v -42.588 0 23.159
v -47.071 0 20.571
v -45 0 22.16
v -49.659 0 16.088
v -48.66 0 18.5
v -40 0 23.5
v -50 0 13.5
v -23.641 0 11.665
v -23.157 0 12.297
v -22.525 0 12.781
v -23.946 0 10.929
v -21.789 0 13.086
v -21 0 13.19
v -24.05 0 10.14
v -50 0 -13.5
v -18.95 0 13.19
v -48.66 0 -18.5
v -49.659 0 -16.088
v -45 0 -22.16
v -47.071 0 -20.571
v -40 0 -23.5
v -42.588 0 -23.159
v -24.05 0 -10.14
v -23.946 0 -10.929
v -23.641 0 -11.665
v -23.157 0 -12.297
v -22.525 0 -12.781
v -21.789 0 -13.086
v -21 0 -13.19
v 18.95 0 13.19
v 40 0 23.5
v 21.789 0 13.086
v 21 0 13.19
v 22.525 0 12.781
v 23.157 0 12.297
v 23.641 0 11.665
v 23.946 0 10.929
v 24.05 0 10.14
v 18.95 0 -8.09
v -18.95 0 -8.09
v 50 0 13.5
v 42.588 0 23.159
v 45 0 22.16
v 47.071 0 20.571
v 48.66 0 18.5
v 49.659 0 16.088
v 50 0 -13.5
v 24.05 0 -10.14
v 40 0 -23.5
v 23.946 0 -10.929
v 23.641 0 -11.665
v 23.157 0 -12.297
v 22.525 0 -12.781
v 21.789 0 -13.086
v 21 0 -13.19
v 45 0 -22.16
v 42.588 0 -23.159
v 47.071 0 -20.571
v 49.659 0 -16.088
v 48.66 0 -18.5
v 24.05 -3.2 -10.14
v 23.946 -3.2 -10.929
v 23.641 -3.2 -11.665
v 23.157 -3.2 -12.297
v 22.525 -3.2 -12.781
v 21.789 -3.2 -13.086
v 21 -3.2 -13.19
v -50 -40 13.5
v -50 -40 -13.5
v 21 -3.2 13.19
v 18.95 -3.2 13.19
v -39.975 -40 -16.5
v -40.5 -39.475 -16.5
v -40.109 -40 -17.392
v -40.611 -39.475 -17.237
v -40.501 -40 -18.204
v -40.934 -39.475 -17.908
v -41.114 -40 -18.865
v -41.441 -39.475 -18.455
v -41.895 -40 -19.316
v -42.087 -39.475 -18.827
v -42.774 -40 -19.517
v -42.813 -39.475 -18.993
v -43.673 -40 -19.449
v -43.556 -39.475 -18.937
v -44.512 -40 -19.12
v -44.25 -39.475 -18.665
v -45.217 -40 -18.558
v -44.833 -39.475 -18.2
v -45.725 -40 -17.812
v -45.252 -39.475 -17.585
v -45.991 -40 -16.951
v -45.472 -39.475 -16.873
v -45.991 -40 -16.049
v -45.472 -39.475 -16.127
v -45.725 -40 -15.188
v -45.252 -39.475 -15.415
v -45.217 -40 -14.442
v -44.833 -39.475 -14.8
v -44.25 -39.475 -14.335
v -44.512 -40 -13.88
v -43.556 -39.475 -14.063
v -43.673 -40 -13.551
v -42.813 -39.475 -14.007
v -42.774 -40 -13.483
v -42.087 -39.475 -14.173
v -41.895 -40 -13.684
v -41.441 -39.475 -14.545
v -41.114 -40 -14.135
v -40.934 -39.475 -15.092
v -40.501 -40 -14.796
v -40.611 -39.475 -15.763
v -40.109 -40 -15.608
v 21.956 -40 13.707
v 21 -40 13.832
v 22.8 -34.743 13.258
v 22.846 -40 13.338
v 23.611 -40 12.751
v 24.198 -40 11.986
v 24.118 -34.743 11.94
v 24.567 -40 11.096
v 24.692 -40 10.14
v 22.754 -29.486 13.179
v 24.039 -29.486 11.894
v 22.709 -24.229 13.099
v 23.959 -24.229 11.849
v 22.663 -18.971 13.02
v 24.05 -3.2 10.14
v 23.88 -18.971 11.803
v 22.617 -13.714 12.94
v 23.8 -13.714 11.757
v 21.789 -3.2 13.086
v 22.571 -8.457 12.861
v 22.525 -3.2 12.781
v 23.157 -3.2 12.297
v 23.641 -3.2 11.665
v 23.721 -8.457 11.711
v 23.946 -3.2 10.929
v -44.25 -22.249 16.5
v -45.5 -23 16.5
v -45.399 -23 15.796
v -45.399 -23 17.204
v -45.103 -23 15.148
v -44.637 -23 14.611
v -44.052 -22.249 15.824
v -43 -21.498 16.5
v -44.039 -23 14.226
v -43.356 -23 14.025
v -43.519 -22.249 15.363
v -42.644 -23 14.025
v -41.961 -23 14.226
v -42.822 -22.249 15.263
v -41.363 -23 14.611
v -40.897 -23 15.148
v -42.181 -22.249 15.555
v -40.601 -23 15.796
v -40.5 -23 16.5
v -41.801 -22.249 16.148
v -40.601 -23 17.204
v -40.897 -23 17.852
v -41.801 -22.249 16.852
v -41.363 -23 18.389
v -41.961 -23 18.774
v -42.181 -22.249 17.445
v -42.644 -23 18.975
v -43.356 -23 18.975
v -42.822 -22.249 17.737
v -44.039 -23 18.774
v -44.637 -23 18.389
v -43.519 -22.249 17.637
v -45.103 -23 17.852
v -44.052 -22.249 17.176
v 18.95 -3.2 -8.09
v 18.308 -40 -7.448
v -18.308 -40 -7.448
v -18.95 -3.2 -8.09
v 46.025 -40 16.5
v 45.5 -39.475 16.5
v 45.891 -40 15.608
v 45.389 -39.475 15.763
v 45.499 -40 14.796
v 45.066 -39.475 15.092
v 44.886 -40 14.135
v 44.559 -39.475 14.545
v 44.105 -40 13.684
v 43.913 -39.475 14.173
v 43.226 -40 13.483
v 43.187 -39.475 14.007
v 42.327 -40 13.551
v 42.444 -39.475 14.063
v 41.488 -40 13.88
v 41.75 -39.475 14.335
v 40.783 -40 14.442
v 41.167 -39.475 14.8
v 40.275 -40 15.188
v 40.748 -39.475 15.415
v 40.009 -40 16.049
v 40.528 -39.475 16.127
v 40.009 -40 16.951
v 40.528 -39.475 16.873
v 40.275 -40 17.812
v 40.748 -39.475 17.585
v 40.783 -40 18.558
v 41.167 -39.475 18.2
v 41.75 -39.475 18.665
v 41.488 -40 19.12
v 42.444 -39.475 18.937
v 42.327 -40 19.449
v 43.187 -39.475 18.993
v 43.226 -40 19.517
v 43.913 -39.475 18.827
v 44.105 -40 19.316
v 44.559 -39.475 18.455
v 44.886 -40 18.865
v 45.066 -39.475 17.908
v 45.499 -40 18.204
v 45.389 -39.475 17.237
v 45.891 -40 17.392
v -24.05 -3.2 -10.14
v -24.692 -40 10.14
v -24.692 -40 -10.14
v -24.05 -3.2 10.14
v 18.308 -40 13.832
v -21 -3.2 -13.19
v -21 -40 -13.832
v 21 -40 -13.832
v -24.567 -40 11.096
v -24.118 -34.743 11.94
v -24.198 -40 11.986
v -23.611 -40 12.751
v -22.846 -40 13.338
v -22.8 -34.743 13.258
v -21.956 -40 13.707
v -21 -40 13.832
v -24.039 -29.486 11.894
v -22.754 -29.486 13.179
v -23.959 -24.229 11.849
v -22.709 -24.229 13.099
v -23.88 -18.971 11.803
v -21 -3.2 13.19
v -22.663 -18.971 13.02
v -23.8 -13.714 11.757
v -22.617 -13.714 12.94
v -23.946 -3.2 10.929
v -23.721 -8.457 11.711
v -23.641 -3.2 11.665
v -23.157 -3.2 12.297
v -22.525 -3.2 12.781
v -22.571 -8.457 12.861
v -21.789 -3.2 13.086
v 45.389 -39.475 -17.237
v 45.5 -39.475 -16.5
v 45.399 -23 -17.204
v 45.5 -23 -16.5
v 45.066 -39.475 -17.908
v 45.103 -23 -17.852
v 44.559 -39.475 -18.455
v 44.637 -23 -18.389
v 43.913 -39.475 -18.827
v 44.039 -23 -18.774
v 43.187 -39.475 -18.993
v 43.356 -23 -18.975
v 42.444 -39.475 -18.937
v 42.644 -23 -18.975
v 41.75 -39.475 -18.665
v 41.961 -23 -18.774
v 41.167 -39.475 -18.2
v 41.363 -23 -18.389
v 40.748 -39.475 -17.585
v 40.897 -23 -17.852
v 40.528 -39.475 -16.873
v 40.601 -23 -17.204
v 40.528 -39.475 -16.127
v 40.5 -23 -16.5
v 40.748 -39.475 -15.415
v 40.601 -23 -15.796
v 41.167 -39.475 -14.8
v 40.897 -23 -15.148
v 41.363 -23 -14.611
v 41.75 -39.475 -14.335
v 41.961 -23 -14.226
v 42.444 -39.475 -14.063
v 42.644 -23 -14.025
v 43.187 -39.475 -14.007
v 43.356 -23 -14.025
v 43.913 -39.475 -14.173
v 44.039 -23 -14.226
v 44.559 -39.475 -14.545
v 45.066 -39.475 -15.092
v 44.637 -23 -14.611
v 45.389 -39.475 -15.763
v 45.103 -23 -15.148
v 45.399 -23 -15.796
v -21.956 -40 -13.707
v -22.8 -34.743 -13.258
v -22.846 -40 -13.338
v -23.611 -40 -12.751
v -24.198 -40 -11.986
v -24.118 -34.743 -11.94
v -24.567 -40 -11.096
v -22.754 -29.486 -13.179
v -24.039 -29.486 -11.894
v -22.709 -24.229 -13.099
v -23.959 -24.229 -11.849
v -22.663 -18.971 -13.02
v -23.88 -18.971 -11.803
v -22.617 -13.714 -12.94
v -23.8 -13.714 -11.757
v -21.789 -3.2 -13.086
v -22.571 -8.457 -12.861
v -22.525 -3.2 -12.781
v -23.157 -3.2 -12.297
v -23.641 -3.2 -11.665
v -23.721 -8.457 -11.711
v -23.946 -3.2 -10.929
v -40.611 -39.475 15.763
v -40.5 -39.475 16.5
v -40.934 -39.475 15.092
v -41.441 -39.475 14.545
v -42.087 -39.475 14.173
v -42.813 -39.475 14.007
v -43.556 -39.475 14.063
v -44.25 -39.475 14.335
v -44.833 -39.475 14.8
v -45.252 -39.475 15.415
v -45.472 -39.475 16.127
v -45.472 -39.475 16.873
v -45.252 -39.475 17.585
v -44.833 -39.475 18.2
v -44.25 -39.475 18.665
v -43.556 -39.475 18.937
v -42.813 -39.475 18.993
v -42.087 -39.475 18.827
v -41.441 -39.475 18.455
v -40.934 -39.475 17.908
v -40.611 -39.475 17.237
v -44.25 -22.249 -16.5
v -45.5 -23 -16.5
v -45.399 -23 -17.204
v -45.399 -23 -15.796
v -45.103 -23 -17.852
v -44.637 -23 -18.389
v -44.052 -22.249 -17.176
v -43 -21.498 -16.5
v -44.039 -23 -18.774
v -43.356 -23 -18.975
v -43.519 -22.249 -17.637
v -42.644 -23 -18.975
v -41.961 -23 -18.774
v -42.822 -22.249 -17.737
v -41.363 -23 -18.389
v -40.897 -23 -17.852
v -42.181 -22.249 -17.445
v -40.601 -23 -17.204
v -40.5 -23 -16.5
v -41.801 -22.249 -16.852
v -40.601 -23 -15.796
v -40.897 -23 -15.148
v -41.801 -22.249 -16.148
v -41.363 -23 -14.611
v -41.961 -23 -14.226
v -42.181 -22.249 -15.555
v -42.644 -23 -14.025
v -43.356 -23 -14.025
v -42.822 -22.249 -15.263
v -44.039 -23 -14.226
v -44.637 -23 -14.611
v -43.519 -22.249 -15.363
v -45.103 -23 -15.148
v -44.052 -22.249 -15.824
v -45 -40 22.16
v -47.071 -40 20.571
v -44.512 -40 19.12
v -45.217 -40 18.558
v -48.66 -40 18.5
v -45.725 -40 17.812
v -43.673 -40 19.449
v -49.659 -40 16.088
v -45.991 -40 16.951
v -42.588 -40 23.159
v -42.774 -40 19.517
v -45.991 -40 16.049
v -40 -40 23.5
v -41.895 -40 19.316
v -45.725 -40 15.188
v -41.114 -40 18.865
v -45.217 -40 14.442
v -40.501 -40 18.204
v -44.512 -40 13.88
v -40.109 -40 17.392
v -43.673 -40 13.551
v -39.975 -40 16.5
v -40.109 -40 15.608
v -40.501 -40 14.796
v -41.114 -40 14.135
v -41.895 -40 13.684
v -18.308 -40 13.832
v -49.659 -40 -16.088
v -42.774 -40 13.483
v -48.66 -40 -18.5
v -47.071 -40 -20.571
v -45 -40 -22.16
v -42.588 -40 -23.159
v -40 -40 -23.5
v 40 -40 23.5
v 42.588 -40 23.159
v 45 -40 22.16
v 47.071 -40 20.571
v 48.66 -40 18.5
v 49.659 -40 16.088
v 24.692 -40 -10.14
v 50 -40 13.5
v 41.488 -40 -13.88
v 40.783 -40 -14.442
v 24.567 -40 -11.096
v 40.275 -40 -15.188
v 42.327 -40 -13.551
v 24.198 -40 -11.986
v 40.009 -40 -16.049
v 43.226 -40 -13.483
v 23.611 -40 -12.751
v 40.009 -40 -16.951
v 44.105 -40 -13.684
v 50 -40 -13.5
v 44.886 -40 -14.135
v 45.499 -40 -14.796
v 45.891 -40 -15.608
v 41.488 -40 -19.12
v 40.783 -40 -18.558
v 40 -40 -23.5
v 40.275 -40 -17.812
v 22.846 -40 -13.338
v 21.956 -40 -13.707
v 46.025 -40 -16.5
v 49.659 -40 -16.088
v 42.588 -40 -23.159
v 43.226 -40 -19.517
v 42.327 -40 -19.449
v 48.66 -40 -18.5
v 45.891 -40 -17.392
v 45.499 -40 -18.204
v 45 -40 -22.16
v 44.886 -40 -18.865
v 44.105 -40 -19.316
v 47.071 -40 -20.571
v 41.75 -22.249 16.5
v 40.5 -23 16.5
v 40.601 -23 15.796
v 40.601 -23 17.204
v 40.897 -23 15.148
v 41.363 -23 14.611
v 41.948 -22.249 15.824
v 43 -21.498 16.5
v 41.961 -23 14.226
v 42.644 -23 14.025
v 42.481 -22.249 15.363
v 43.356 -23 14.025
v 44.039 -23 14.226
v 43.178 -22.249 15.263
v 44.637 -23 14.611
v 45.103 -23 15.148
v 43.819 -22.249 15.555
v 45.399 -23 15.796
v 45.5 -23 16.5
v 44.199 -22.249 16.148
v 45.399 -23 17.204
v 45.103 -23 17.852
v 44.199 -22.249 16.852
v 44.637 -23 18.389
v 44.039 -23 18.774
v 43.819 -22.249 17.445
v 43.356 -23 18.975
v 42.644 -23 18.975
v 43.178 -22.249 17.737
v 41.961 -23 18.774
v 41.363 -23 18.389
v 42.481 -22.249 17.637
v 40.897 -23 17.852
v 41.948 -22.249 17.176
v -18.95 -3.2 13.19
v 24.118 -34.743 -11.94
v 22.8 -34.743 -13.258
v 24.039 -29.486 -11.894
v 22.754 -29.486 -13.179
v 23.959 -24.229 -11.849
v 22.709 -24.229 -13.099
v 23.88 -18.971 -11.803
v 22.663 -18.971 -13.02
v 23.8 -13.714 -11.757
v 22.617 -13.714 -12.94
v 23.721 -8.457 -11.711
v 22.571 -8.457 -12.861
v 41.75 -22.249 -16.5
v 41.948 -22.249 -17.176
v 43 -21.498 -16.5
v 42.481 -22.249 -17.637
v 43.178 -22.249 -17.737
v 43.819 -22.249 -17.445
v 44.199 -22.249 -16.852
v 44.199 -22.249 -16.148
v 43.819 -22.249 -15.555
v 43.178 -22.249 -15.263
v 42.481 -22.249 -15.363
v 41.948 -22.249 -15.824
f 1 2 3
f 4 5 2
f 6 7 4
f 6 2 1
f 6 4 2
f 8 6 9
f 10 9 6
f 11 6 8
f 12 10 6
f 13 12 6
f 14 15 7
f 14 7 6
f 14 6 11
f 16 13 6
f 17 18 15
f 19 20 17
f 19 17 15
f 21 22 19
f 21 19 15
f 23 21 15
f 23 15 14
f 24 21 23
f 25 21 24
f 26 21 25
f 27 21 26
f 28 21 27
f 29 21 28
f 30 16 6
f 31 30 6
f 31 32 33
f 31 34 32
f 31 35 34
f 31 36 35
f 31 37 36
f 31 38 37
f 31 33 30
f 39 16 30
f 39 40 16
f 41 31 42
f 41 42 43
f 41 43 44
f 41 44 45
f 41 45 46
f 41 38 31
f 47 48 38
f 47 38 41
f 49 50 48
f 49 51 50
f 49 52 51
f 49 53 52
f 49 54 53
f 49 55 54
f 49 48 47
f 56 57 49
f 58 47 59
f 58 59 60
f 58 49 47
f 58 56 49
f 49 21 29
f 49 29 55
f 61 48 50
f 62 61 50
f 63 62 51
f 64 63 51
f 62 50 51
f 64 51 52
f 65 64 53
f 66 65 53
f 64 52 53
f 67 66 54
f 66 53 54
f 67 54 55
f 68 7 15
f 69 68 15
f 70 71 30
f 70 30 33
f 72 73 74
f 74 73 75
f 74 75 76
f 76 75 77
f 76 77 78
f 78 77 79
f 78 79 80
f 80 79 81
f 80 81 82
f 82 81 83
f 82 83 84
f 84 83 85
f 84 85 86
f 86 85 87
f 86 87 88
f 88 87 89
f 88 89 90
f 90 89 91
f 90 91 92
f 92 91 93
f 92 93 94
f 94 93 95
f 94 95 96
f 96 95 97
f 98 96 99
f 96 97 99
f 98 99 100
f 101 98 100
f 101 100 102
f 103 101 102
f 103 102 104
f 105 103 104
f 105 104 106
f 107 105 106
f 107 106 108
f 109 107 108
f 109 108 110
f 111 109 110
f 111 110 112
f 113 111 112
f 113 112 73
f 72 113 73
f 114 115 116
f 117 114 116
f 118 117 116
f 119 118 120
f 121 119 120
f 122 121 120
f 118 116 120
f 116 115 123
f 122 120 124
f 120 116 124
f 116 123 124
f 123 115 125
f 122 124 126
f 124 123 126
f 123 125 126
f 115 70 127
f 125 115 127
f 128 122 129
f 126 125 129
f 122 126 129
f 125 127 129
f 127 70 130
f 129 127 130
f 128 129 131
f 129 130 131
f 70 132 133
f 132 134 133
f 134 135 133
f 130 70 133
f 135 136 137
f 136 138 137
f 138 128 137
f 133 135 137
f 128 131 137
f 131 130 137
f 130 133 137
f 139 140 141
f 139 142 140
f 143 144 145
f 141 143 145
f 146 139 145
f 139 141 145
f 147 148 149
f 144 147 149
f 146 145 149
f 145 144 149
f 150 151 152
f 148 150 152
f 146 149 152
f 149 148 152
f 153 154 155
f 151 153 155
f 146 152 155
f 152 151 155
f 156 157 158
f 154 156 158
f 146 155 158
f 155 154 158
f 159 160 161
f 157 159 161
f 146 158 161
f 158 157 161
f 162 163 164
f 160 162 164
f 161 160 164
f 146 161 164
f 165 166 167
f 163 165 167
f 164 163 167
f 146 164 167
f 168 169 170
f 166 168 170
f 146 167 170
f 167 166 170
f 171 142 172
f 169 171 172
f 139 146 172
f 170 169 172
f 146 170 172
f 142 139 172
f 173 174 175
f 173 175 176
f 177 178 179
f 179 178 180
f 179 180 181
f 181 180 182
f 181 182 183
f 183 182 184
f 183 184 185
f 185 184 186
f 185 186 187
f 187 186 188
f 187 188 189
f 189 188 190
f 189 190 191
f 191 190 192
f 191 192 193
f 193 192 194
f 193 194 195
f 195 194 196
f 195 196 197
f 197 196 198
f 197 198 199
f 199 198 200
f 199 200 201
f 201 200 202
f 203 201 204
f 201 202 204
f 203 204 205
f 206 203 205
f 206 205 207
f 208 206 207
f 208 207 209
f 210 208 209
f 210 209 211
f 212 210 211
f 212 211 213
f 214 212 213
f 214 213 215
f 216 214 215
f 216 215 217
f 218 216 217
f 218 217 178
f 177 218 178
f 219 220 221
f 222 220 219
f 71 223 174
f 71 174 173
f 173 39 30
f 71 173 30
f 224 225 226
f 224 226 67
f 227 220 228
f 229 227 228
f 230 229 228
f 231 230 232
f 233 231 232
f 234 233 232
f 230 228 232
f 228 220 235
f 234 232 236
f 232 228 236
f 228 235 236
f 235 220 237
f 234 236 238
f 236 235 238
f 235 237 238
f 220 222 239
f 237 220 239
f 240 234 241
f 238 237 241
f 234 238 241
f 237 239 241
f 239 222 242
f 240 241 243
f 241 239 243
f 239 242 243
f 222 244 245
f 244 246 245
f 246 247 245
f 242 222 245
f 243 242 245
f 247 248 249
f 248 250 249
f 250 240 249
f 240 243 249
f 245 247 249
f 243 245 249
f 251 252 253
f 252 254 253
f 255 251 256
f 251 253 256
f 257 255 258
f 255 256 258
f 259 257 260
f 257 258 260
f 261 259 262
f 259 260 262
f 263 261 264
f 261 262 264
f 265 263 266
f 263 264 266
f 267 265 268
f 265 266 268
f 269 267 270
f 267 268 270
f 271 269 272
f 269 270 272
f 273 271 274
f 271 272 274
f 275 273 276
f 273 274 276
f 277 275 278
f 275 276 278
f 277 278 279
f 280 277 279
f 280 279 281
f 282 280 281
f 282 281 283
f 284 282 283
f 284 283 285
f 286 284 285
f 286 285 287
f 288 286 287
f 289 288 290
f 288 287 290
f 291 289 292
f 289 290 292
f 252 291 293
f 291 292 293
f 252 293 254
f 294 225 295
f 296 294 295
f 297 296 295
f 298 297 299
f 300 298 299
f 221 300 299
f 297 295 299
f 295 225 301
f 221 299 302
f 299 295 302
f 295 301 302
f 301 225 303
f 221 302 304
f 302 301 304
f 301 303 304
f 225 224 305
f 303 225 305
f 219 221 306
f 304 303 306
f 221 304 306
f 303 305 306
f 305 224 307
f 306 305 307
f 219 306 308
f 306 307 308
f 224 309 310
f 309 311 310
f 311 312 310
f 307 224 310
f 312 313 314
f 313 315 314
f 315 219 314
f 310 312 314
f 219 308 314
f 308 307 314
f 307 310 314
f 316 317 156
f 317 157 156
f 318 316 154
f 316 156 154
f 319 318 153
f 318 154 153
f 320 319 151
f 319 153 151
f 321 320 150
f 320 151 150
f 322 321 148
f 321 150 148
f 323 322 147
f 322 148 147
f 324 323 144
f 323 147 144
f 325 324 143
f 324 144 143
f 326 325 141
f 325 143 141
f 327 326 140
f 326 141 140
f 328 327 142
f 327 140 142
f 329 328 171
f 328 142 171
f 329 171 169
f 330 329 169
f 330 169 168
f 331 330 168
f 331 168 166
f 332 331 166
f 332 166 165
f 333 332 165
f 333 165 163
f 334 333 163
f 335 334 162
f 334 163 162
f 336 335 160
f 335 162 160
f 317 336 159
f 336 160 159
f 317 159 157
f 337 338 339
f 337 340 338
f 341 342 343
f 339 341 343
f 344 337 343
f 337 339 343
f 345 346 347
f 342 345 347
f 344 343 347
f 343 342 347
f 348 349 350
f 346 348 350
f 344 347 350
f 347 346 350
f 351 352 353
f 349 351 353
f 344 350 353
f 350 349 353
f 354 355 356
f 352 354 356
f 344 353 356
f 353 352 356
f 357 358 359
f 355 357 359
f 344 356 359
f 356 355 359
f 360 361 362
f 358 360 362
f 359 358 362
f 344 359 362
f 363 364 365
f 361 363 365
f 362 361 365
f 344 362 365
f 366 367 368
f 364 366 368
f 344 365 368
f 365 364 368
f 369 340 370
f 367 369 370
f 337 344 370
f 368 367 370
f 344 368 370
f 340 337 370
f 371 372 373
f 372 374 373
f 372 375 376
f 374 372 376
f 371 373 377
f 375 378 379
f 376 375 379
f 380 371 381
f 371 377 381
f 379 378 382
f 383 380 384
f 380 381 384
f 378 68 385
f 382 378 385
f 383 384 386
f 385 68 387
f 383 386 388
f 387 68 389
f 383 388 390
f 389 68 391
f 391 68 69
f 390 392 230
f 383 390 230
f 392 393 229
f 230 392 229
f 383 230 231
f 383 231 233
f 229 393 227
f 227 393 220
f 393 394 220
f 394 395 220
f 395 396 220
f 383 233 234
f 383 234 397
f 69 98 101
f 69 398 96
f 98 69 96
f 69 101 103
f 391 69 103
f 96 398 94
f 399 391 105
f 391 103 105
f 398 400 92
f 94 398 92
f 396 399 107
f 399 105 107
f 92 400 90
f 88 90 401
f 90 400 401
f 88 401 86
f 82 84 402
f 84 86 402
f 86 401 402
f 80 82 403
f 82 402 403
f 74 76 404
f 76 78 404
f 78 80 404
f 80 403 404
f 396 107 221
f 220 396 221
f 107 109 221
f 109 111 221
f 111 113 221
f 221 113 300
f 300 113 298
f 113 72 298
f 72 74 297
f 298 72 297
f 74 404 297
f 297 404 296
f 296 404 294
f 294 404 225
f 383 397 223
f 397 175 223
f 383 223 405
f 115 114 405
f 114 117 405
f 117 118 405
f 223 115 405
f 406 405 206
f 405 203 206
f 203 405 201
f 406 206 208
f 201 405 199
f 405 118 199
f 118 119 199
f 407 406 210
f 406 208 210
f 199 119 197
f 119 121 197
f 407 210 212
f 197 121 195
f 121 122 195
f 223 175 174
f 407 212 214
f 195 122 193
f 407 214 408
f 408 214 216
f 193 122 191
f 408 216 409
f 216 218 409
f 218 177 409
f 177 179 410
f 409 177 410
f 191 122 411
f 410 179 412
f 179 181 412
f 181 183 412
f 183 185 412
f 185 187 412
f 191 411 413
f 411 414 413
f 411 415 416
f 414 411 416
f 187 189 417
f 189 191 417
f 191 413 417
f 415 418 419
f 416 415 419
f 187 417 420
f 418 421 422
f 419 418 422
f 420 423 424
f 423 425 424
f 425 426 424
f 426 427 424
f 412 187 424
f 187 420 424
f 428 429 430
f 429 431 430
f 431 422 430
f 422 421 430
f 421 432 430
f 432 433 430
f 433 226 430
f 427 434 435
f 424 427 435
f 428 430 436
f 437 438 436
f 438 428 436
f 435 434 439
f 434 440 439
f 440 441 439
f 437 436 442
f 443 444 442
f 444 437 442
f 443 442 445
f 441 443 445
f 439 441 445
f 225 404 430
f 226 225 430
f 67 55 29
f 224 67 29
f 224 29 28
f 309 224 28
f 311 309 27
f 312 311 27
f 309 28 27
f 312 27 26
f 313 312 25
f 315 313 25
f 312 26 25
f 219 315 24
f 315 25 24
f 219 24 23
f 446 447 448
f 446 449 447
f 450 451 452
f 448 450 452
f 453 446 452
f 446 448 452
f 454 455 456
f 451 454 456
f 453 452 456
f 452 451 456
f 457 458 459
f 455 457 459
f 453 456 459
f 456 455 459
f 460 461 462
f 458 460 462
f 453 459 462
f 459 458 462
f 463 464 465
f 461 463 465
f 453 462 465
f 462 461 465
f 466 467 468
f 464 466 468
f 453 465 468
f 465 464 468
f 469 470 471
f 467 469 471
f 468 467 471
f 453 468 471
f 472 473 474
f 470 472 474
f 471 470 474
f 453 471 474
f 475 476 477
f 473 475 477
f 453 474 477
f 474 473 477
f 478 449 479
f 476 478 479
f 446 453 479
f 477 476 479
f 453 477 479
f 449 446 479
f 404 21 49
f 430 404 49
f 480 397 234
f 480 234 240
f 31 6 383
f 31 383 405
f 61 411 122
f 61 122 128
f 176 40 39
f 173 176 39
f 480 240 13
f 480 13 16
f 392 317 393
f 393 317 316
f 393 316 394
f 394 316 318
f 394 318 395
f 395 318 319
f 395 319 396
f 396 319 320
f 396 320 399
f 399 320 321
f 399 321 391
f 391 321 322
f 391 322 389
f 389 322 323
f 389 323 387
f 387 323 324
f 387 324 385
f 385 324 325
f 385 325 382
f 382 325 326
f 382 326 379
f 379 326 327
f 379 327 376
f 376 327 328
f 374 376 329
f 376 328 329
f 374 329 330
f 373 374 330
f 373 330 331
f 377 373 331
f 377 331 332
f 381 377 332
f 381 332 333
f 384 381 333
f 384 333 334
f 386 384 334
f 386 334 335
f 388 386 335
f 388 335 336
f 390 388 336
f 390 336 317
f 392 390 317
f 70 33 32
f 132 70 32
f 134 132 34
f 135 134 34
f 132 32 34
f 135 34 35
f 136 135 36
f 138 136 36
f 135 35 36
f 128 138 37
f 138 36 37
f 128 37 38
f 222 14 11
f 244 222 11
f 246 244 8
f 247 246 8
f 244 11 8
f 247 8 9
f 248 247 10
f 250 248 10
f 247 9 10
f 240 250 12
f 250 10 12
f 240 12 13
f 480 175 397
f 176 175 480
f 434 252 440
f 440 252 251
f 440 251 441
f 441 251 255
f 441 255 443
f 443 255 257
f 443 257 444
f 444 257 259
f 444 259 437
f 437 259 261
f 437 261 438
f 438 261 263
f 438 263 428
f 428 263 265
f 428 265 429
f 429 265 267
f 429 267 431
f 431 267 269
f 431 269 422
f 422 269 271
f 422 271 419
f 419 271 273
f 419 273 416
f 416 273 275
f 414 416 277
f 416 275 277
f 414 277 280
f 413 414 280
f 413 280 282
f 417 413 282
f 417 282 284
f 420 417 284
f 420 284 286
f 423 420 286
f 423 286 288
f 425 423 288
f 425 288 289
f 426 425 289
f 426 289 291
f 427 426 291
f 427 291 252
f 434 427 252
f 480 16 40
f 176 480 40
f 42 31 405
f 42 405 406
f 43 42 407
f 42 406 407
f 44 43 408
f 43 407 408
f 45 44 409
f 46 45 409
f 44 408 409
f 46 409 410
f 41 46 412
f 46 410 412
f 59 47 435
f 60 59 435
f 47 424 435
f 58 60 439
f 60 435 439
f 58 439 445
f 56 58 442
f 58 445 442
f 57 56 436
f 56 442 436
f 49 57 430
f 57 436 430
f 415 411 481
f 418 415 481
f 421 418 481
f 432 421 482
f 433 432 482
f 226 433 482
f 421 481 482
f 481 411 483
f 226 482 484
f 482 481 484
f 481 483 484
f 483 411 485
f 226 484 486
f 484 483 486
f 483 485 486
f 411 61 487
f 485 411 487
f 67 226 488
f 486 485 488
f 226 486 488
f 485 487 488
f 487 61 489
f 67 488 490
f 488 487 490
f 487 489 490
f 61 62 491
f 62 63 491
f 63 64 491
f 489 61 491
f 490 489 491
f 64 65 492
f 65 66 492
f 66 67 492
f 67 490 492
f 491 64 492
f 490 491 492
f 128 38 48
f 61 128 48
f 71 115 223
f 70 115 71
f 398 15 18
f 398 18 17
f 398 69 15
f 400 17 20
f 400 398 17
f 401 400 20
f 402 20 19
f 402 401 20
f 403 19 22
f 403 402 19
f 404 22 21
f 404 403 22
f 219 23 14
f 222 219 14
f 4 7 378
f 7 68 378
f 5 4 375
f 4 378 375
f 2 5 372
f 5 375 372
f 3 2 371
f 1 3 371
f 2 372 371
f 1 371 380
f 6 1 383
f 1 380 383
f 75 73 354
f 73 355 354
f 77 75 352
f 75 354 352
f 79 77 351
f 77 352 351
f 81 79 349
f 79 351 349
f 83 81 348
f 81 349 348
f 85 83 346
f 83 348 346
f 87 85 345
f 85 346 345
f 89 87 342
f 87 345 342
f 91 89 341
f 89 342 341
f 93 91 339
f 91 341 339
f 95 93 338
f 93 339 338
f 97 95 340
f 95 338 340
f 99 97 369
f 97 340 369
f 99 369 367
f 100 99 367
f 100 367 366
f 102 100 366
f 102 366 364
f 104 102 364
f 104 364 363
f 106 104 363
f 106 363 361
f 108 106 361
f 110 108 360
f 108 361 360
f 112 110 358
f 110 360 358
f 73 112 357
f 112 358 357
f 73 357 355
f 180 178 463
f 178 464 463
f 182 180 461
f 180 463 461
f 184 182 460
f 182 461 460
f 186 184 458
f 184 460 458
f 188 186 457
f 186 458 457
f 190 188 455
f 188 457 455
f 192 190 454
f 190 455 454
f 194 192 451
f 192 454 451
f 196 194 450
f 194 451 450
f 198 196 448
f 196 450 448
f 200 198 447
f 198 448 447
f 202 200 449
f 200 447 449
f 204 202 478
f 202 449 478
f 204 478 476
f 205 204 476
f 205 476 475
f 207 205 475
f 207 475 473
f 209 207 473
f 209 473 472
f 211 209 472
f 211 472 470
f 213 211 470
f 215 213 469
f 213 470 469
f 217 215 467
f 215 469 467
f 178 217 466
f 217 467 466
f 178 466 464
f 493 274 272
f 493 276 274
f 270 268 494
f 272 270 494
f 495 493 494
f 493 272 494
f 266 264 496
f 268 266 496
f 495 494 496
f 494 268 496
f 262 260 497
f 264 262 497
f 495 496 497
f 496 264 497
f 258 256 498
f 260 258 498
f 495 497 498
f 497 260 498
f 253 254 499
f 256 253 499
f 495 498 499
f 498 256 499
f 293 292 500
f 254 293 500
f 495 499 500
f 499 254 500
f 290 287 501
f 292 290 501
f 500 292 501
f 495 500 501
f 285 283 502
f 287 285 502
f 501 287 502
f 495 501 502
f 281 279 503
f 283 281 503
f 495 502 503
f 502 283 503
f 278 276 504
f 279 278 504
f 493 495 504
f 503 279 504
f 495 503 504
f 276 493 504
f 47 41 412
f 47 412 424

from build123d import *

# Parameters (mm, degrees)
SKETCH2_W                   = 100
SKETCH2_H                   = 47
BOSS_EXTRUDE1_DEPTH         = 40
FILLET1_R                   = 10
CUT_EXTRUDE1_REACH          = 70.207
M6_TAPPED_HOLE1_D           = 5
M6_TAPPED_HOLE1_DEPTH       = 17
M6_TAPPED_HOLE1_CSINK_D     = 6.05
M6_TAPPED_HOLE1_CSINK_ANGLE = 90
M6_TAPPED_HOLE1_TIP         = 1.502151548


with BuildPart() as part:
    # Sketch2 → Boss-Extrude1 (new body)
    with BuildSketch(Plane(origin=(0, 0, 0), x_dir=(1, 0, 0), z_dir=(0, 1, 0))):
        Rectangle(SKETCH2_W, SKETCH2_H)
    extrude(amount=-BOSS_EXTRUDE1_DEPTH)

    # Fillet1
    fillet1_edges = [part.edges().sort_by_distance(p)[0] for p in [
        (50, -20, 23.5),
        (-50, -20, 23.5),
        (-50, -20, -23.5),
        (50, -20, -23.5),
    ]]
    fillet(fillet1_edges, radius=FILLET1_R)

    # Sketch3 → Cut-Extrude1 (cut, up to next)
    with BuildSketch(Plane(origin=(0, 0, 0), x_dir=(1, 0, 0), z_dir=(0, 1, 0)), mode=Mode.PRIVATE) as cut_extrude1_sk1:
        with BuildLine():
            Line((24.05, -10.14), (24.05, 10.14))
            ThreePointArc((24.05, 10.14), (23.156675683, 12.296675683), (21, 13.19))
            Line((21, 13.19), (-21, 13.19))
            ThreePointArc((-21, 13.19), (-23.156675683, 12.296675683), (-24.05, 10.14))
            Line((-24.05, 10.14), (-24.05, -10.14))
            ThreePointArc((-24.05, -10.14), (-23.156675683, -12.296675683), (-21, -13.19))
            Line((-21, -13.19), (-18.95, -13.19))
            Line((-18.95, -13.19), (-18.95, 8.09))
            Line((-18.95, 8.09), (18.95, 8.09))
            Line((18.95, 8.09), (18.95, -13.19))
            Line((18.95, -13.19), (21, -13.19))
            ThreePointArc((21, -13.19), (23.156675683, -12.296675683), (24.05, -10.14))
        make_face()
    cut_extrude1_tool1 = extrude(cut_extrude1_sk1.sketch, amount=-CUT_EXTRUDE1_REACH, mode=Mode.PRIVATE) & part.part
    add(cut_extrude1_tool1.solids().sort_by_distance((23.50141, 0, 0))[0], mode=Mode.SUBTRACT)

    # M6 Tapped Hole1
    with Locations(Plane(origin=(0, -40, 0), x_dir=(-1, 0, 0), z_dir=(0, -1, 0))):
        with Locations((-43, 16.5), (43, 16.5), (43, -16.5), (-43, -16.5)):
            CounterSinkHole(M6_TAPPED_HOLE1_D / 2, M6_TAPPED_HOLE1_CSINK_D / 2, depth=M6_TAPPED_HOLE1_DEPTH, counter_sink_angle=M6_TAPPED_HOLE1_CSINK_ANGLE)
            with Locations((0, 0, -(M6_TAPPED_HOLE1_DEPTH + M6_TAPPED_HOLE1_TIP / 2))):  # 118° drill point
                Cone(0, M6_TAPPED_HOLE1_D / 2, M6_TAPPED_HOLE1_TIP, mode=Mode.SUBTRACT)

    # Cut-Sweep1: sweep along a path in Sketch8
    with BuildLine(Plane(origin=(0, 0, 0), x_dir=(1, 0, 0), z_dir=(0, 1, 0))) as cut_sweep1_path:
        Line((18.95, 8.09), (18.95, -13.19))
        Line((18.95, -13.19), (21, -13.19))
        ThreePointArc((21, -13.19), (23.156675683, -12.296675683), (24.05, -10.14))
        Line((24.05, -10.14), (24.05, 10.14))
        ThreePointArc((24.05, 10.14), (23.156675683, 12.296675683), (21, 13.19))
        Line((21, 13.19), (-21, 13.19))
        ThreePointArc((-21, 13.19), (-23.156675683, 12.296675683), (-24.05, 10.14))
        Line((-24.05, 10.14), (-24.05, -10.14))
        ThreePointArc((-24.05, -10.14), (-23.156675683, -12.296675683), (-21, -13.19))
        Line((-21, -13.19), (-18.95, -13.19))
        Line((-18.95, -13.19), (-18.95, 8.09))
        Line((-18.95, 8.09), (18.95, 8.09))
    # Sketch7 → Cut-Sweep1 (sweep, cut)
    with BuildSketch(Plane(origin=(0, 0, 0), x_dir=(0, 0, -1), z_dir=(1, 0, 0))):
        Polygon((13.19, -3.2), (13.832346389, -40), (13.19, -40), align=None)
    sweep(path=cut_sweep1_path.line, transition=Transition.RIGHT, mode=Mode.SUBTRACT)


solid = part.part
